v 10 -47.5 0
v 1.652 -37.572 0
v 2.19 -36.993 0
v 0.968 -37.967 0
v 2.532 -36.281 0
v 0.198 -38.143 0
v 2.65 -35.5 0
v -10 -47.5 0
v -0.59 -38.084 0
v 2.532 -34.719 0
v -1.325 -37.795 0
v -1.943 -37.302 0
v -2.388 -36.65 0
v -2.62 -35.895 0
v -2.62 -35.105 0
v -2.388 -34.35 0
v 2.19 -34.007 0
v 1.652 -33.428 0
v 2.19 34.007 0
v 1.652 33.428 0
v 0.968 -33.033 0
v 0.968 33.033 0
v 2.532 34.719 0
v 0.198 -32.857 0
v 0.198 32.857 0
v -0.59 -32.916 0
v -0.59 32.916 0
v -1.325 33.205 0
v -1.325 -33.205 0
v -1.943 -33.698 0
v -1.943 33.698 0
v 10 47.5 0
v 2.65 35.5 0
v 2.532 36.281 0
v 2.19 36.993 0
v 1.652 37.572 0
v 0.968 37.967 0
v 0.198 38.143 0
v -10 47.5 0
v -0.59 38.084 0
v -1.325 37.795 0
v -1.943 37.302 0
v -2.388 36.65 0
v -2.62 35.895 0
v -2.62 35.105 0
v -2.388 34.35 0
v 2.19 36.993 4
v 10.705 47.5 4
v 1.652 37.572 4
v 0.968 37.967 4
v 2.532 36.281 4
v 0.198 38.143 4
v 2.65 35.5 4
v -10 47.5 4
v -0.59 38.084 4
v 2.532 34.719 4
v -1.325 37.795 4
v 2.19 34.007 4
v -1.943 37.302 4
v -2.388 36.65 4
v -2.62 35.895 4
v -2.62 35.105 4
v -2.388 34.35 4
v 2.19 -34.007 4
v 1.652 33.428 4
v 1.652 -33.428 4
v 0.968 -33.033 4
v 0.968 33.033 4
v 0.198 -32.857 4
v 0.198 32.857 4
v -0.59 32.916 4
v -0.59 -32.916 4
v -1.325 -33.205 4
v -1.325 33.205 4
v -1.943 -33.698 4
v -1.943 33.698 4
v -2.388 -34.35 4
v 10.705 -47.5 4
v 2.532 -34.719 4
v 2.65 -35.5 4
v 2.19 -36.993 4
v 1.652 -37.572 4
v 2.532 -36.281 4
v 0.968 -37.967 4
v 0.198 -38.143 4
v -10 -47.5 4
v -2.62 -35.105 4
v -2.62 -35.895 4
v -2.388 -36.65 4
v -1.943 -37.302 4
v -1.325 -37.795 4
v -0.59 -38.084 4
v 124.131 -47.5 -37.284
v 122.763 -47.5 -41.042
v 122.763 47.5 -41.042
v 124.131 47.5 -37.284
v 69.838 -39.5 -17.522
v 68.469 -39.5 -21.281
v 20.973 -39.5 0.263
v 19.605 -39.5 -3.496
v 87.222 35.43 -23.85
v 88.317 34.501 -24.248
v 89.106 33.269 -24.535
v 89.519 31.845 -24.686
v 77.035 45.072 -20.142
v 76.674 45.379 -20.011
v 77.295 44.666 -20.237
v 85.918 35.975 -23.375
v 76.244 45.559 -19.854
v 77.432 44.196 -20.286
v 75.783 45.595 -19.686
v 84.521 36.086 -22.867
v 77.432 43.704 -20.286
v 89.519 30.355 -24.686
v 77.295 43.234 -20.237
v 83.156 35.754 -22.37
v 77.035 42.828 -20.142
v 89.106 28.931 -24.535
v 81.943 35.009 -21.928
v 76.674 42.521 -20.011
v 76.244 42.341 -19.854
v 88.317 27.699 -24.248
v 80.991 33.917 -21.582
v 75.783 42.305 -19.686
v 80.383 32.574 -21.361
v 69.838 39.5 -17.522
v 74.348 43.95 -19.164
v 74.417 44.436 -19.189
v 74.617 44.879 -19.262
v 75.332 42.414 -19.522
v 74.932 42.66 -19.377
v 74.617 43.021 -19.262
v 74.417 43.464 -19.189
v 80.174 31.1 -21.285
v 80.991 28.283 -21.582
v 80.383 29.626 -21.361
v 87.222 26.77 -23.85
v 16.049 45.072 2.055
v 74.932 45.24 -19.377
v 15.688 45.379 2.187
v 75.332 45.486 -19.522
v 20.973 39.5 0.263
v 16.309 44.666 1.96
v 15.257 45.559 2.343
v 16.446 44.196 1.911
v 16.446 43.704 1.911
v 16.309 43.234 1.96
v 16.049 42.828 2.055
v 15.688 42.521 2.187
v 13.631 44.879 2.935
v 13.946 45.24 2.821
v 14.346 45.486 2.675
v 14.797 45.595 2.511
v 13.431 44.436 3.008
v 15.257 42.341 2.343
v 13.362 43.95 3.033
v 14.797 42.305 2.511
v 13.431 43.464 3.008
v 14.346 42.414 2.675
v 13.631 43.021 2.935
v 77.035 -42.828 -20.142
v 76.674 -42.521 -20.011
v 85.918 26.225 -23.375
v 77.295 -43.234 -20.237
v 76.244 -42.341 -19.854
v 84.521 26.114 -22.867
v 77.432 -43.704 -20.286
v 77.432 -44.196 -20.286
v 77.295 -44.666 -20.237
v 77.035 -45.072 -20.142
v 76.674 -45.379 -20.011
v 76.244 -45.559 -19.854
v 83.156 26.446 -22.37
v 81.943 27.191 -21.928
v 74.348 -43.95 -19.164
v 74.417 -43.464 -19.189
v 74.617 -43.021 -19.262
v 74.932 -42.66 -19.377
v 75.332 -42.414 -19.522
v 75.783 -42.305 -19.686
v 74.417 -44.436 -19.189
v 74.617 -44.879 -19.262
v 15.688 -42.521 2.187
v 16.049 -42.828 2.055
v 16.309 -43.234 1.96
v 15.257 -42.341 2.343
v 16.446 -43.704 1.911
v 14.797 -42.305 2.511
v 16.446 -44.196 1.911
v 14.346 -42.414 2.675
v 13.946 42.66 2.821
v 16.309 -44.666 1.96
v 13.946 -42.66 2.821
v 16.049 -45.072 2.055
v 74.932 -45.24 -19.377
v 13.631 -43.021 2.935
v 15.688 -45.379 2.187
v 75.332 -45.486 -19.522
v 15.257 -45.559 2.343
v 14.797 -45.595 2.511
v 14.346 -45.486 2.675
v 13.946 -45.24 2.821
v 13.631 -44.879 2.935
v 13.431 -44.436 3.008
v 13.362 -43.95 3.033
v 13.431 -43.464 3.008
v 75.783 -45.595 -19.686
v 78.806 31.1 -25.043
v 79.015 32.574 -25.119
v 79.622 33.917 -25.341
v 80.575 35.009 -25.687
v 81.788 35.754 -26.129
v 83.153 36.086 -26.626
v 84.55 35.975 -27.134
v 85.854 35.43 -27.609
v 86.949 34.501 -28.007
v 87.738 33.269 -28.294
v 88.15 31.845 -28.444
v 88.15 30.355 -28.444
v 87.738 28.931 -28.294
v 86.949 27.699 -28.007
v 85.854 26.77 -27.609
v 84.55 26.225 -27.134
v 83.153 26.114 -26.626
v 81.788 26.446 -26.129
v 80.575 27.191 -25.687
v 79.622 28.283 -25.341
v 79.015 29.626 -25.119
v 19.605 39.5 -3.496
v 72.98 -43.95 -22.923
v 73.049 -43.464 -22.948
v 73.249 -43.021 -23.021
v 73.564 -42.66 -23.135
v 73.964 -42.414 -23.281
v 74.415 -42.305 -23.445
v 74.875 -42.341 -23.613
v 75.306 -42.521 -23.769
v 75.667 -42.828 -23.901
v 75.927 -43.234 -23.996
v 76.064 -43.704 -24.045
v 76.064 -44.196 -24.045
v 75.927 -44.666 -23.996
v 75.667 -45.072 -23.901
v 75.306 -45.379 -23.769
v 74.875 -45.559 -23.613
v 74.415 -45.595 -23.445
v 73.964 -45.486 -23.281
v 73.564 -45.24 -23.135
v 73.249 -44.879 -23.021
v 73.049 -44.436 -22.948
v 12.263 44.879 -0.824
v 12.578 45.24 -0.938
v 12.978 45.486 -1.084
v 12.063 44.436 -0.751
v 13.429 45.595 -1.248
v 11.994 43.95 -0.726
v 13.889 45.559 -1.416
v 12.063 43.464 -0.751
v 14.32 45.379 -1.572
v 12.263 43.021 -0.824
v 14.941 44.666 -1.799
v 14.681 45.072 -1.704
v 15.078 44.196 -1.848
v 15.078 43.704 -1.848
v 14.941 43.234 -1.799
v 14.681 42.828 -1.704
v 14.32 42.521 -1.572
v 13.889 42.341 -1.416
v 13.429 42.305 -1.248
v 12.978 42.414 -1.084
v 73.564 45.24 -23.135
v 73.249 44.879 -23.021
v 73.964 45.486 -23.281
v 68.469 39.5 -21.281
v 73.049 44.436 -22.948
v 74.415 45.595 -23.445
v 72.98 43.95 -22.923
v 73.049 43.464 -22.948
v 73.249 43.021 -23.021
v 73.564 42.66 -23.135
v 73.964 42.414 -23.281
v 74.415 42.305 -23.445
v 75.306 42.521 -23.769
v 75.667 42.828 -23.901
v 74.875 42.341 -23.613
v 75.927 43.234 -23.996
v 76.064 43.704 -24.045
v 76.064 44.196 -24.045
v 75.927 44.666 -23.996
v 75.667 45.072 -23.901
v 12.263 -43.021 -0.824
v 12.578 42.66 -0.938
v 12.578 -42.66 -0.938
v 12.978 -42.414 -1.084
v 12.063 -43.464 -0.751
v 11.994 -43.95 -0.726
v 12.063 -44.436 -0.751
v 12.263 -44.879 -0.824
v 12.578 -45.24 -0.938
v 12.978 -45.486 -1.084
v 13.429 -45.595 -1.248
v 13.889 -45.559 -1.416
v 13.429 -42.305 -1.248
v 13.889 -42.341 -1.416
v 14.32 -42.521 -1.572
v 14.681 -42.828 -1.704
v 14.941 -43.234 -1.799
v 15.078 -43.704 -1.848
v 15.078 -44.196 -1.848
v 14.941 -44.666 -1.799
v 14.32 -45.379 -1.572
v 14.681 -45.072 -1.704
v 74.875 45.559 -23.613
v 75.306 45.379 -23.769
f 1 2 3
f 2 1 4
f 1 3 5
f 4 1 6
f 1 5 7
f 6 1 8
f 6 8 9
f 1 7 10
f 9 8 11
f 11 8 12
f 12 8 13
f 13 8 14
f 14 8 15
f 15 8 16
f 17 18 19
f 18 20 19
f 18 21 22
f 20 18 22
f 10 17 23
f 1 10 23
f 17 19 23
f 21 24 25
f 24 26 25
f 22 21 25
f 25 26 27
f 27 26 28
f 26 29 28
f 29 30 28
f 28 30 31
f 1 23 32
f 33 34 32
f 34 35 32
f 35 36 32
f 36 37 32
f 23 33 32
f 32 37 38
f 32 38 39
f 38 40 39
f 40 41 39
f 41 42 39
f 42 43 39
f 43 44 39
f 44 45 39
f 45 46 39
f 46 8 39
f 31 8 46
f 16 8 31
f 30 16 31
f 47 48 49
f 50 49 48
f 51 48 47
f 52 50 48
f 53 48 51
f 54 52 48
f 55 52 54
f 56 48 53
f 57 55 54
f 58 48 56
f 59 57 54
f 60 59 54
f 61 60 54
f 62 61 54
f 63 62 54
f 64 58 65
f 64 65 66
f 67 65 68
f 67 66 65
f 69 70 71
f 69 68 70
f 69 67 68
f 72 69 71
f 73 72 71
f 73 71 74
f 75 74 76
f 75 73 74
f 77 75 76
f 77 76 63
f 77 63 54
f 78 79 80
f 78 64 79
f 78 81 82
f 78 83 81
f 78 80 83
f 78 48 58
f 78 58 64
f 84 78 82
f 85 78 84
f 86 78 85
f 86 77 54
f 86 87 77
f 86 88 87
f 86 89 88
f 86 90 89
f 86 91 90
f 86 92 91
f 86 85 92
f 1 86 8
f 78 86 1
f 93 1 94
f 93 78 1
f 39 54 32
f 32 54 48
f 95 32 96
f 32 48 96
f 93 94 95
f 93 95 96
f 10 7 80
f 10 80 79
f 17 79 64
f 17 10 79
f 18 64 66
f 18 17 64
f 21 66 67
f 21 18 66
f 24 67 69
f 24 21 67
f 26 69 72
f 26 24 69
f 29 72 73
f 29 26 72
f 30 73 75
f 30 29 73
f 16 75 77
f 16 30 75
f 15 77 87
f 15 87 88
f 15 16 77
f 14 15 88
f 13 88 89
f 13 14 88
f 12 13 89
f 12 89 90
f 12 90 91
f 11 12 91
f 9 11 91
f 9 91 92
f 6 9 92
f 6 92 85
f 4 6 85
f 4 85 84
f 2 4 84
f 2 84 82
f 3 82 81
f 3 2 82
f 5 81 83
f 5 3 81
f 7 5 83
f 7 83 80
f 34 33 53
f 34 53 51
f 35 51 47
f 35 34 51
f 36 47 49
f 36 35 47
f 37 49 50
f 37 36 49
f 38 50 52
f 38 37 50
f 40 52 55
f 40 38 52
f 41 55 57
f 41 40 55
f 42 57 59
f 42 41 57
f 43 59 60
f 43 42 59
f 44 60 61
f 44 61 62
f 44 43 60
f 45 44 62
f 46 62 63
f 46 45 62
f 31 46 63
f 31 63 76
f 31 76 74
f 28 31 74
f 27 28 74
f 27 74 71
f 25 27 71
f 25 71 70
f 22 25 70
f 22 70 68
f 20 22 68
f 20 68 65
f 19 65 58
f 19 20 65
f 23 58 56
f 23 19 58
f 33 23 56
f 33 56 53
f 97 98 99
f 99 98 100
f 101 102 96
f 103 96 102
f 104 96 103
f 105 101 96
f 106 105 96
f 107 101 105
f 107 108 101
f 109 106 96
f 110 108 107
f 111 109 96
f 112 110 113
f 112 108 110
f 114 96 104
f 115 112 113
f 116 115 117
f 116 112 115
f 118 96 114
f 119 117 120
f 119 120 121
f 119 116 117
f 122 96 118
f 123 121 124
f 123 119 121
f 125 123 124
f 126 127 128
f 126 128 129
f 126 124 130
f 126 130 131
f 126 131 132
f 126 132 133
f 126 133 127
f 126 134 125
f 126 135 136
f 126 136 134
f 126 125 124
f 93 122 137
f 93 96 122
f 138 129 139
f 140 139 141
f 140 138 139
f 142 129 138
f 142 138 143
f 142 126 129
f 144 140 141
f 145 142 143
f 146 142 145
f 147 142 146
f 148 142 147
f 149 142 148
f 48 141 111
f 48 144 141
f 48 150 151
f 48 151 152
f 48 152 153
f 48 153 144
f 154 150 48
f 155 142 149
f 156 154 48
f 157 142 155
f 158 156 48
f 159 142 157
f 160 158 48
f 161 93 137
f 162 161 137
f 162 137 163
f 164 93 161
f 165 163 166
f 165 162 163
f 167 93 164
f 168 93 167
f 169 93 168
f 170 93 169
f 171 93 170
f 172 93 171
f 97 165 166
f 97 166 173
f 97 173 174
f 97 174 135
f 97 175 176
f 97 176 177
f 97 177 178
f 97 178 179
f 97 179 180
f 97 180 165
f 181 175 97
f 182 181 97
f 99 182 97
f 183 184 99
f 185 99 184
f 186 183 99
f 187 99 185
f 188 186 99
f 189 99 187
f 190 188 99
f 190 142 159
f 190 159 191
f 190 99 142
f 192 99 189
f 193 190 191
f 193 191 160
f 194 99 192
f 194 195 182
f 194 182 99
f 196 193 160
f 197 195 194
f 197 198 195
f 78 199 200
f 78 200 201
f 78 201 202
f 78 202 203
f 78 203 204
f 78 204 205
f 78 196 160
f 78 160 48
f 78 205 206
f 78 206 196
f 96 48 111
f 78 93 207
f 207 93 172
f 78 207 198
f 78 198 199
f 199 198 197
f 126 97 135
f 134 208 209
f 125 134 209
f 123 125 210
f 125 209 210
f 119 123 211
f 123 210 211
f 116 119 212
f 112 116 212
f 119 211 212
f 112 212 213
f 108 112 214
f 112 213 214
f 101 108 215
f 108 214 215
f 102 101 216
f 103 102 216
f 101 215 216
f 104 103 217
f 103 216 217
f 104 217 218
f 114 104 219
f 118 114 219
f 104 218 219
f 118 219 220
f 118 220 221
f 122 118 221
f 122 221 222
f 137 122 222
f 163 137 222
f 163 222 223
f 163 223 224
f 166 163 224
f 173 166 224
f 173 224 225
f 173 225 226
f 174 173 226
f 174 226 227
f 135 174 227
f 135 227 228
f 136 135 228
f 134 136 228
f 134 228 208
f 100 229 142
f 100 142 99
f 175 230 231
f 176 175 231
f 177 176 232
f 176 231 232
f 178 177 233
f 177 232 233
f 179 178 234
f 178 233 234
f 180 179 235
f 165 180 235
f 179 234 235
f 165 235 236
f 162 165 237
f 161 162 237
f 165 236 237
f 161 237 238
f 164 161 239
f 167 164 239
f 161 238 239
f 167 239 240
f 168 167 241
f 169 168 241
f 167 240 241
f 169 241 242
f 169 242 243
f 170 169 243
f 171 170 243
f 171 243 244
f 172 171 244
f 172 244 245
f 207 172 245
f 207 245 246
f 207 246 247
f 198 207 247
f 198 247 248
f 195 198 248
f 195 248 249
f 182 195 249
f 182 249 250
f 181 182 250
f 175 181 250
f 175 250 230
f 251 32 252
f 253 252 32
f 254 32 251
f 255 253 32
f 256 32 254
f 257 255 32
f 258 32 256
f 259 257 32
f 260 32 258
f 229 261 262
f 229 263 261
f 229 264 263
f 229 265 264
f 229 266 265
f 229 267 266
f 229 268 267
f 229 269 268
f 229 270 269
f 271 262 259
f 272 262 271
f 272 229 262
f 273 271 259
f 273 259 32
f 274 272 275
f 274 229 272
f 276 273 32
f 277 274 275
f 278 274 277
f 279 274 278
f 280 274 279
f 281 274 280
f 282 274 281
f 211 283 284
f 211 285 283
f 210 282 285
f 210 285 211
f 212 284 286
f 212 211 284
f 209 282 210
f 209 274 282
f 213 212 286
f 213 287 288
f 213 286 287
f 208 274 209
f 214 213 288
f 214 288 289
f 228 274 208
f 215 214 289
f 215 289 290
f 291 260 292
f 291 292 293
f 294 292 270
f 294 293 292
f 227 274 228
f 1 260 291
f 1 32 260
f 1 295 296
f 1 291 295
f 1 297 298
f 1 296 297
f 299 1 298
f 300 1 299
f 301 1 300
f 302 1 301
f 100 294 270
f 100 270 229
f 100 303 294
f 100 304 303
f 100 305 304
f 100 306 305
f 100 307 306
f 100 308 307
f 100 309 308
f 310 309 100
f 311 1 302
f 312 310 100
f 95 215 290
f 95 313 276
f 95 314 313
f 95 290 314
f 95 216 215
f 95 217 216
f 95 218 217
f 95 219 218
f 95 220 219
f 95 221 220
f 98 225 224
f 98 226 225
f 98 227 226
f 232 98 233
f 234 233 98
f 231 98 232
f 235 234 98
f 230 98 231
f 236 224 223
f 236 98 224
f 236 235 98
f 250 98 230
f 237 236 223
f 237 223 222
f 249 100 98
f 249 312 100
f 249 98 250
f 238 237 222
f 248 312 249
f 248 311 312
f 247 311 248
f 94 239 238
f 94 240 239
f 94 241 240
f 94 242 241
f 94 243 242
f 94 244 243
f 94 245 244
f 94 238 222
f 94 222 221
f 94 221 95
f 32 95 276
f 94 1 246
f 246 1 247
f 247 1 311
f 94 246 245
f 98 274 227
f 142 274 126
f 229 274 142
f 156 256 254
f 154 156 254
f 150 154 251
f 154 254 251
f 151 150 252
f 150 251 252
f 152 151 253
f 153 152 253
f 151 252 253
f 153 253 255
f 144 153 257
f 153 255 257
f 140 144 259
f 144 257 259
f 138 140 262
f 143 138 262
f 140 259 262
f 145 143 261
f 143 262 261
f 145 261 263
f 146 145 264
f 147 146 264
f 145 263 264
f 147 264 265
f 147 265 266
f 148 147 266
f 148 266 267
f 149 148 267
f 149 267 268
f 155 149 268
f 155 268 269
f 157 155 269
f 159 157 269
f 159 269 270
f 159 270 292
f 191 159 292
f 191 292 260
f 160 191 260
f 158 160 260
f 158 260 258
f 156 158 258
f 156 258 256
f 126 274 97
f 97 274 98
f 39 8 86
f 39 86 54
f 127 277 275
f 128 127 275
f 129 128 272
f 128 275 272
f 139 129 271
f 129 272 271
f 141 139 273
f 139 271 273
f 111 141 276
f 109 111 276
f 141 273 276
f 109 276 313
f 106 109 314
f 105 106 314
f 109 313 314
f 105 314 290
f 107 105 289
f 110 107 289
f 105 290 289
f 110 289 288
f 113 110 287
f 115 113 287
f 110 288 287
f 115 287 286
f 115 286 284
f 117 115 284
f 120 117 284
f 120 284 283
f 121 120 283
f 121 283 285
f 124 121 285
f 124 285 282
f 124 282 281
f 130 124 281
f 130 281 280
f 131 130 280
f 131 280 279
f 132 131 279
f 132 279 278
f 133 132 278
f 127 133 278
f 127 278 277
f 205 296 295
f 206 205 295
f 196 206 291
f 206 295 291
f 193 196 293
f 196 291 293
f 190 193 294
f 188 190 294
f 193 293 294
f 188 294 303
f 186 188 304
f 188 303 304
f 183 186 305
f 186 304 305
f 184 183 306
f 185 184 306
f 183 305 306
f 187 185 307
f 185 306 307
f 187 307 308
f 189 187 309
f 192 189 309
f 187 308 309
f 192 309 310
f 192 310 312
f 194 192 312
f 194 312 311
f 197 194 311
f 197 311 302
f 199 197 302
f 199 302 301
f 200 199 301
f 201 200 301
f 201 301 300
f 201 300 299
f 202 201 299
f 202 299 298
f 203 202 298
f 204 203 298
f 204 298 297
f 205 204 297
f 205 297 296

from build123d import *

# Parameters (mm, degrees)
SKETCH1_W           = 95
SKETCH1_H           = 20
SKETCH1_R           = 2.65
BOSS_EXTRUDE1_DEPTH = 4
BOSS_EXTRUDE2_DEPTH = 95
SKETCH3_R           = 1.65
SKETCH3_R_2         = 5
SKETCH3_W           = 79
SKETCH3_H           = 52
CUT_EXTRUDE1_DEPTH  = 140.048139578


with BuildPart() as part:
    # Sketch1 → Boss-Extrude1 (new body)
    with BuildSketch(Plane(origin=(0, 0, 0), x_dir=(0, 1, 0), z_dir=(0, 0, 1))):
        Rectangle(SKETCH1_W, SKETCH1_H)
        with Locations(Location((35.5, 0, 0), (0, 0, 270))):
            Circle(SKETCH1_R, mode=Mode.SUBTRACT)
        with Locations(Location((-35.5, 0, 0), (0, 0, 270))):
            Circle(SKETCH1_R, mode=Mode.SUBTRACT)
    extrude(amount=BOSS_EXTRUDE1_DEPTH)

    # Sketch2 → Boss-Extrude2 (add)
    with BuildSketch(Plane.XZ.offset(47.5)):
        Polygon((10, 0), (122.763114494, -41.042417199), (124.131195068, -37.283646716), (10.705307923, 4), (10, 4), align=None)
    extrude(amount=-BOSS_EXTRUDE2_DEPTH)

    # Sketch3 → Cut-Extrude1 (cut, through all)
    with BuildSketch(Plane(origin=(1.169777784, 0, 3.213938048), x_dir=(0, -1, 0), z_dir=(-0.34202014332566977, 0, -0.9396926207859081))):
        with Locations(Location((43.95, -13.168790985, 0), (0, 0, 90))):
            Circle(SKETCH3_R)
        with Locations(Location((43.95, -78.068790985, 0), (0, 0, 90))):
            Circle(SKETCH3_R)
        with Locations(Location((-43.95, -78.068790985, 0), (0, 0, 90))):
            Circle(SKETCH3_R)
        with Locations(Location((-43.95, -13.168790985, 0), (0, 0, 90))):
            Circle(SKETCH3_R)
        with Locations(Location((-31.1, -87.618790985, 0), (0, 0, 90))):
            Circle(SKETCH3_R_2)
        with Locations((0, -45.618790985)):
            Rectangle(SKETCH3_W, SKETCH3_H)
    extrude(amount=-CUT_EXTRUDE1_DEPTH, mode=Mode.SUBTRACT)


solid = part.part
